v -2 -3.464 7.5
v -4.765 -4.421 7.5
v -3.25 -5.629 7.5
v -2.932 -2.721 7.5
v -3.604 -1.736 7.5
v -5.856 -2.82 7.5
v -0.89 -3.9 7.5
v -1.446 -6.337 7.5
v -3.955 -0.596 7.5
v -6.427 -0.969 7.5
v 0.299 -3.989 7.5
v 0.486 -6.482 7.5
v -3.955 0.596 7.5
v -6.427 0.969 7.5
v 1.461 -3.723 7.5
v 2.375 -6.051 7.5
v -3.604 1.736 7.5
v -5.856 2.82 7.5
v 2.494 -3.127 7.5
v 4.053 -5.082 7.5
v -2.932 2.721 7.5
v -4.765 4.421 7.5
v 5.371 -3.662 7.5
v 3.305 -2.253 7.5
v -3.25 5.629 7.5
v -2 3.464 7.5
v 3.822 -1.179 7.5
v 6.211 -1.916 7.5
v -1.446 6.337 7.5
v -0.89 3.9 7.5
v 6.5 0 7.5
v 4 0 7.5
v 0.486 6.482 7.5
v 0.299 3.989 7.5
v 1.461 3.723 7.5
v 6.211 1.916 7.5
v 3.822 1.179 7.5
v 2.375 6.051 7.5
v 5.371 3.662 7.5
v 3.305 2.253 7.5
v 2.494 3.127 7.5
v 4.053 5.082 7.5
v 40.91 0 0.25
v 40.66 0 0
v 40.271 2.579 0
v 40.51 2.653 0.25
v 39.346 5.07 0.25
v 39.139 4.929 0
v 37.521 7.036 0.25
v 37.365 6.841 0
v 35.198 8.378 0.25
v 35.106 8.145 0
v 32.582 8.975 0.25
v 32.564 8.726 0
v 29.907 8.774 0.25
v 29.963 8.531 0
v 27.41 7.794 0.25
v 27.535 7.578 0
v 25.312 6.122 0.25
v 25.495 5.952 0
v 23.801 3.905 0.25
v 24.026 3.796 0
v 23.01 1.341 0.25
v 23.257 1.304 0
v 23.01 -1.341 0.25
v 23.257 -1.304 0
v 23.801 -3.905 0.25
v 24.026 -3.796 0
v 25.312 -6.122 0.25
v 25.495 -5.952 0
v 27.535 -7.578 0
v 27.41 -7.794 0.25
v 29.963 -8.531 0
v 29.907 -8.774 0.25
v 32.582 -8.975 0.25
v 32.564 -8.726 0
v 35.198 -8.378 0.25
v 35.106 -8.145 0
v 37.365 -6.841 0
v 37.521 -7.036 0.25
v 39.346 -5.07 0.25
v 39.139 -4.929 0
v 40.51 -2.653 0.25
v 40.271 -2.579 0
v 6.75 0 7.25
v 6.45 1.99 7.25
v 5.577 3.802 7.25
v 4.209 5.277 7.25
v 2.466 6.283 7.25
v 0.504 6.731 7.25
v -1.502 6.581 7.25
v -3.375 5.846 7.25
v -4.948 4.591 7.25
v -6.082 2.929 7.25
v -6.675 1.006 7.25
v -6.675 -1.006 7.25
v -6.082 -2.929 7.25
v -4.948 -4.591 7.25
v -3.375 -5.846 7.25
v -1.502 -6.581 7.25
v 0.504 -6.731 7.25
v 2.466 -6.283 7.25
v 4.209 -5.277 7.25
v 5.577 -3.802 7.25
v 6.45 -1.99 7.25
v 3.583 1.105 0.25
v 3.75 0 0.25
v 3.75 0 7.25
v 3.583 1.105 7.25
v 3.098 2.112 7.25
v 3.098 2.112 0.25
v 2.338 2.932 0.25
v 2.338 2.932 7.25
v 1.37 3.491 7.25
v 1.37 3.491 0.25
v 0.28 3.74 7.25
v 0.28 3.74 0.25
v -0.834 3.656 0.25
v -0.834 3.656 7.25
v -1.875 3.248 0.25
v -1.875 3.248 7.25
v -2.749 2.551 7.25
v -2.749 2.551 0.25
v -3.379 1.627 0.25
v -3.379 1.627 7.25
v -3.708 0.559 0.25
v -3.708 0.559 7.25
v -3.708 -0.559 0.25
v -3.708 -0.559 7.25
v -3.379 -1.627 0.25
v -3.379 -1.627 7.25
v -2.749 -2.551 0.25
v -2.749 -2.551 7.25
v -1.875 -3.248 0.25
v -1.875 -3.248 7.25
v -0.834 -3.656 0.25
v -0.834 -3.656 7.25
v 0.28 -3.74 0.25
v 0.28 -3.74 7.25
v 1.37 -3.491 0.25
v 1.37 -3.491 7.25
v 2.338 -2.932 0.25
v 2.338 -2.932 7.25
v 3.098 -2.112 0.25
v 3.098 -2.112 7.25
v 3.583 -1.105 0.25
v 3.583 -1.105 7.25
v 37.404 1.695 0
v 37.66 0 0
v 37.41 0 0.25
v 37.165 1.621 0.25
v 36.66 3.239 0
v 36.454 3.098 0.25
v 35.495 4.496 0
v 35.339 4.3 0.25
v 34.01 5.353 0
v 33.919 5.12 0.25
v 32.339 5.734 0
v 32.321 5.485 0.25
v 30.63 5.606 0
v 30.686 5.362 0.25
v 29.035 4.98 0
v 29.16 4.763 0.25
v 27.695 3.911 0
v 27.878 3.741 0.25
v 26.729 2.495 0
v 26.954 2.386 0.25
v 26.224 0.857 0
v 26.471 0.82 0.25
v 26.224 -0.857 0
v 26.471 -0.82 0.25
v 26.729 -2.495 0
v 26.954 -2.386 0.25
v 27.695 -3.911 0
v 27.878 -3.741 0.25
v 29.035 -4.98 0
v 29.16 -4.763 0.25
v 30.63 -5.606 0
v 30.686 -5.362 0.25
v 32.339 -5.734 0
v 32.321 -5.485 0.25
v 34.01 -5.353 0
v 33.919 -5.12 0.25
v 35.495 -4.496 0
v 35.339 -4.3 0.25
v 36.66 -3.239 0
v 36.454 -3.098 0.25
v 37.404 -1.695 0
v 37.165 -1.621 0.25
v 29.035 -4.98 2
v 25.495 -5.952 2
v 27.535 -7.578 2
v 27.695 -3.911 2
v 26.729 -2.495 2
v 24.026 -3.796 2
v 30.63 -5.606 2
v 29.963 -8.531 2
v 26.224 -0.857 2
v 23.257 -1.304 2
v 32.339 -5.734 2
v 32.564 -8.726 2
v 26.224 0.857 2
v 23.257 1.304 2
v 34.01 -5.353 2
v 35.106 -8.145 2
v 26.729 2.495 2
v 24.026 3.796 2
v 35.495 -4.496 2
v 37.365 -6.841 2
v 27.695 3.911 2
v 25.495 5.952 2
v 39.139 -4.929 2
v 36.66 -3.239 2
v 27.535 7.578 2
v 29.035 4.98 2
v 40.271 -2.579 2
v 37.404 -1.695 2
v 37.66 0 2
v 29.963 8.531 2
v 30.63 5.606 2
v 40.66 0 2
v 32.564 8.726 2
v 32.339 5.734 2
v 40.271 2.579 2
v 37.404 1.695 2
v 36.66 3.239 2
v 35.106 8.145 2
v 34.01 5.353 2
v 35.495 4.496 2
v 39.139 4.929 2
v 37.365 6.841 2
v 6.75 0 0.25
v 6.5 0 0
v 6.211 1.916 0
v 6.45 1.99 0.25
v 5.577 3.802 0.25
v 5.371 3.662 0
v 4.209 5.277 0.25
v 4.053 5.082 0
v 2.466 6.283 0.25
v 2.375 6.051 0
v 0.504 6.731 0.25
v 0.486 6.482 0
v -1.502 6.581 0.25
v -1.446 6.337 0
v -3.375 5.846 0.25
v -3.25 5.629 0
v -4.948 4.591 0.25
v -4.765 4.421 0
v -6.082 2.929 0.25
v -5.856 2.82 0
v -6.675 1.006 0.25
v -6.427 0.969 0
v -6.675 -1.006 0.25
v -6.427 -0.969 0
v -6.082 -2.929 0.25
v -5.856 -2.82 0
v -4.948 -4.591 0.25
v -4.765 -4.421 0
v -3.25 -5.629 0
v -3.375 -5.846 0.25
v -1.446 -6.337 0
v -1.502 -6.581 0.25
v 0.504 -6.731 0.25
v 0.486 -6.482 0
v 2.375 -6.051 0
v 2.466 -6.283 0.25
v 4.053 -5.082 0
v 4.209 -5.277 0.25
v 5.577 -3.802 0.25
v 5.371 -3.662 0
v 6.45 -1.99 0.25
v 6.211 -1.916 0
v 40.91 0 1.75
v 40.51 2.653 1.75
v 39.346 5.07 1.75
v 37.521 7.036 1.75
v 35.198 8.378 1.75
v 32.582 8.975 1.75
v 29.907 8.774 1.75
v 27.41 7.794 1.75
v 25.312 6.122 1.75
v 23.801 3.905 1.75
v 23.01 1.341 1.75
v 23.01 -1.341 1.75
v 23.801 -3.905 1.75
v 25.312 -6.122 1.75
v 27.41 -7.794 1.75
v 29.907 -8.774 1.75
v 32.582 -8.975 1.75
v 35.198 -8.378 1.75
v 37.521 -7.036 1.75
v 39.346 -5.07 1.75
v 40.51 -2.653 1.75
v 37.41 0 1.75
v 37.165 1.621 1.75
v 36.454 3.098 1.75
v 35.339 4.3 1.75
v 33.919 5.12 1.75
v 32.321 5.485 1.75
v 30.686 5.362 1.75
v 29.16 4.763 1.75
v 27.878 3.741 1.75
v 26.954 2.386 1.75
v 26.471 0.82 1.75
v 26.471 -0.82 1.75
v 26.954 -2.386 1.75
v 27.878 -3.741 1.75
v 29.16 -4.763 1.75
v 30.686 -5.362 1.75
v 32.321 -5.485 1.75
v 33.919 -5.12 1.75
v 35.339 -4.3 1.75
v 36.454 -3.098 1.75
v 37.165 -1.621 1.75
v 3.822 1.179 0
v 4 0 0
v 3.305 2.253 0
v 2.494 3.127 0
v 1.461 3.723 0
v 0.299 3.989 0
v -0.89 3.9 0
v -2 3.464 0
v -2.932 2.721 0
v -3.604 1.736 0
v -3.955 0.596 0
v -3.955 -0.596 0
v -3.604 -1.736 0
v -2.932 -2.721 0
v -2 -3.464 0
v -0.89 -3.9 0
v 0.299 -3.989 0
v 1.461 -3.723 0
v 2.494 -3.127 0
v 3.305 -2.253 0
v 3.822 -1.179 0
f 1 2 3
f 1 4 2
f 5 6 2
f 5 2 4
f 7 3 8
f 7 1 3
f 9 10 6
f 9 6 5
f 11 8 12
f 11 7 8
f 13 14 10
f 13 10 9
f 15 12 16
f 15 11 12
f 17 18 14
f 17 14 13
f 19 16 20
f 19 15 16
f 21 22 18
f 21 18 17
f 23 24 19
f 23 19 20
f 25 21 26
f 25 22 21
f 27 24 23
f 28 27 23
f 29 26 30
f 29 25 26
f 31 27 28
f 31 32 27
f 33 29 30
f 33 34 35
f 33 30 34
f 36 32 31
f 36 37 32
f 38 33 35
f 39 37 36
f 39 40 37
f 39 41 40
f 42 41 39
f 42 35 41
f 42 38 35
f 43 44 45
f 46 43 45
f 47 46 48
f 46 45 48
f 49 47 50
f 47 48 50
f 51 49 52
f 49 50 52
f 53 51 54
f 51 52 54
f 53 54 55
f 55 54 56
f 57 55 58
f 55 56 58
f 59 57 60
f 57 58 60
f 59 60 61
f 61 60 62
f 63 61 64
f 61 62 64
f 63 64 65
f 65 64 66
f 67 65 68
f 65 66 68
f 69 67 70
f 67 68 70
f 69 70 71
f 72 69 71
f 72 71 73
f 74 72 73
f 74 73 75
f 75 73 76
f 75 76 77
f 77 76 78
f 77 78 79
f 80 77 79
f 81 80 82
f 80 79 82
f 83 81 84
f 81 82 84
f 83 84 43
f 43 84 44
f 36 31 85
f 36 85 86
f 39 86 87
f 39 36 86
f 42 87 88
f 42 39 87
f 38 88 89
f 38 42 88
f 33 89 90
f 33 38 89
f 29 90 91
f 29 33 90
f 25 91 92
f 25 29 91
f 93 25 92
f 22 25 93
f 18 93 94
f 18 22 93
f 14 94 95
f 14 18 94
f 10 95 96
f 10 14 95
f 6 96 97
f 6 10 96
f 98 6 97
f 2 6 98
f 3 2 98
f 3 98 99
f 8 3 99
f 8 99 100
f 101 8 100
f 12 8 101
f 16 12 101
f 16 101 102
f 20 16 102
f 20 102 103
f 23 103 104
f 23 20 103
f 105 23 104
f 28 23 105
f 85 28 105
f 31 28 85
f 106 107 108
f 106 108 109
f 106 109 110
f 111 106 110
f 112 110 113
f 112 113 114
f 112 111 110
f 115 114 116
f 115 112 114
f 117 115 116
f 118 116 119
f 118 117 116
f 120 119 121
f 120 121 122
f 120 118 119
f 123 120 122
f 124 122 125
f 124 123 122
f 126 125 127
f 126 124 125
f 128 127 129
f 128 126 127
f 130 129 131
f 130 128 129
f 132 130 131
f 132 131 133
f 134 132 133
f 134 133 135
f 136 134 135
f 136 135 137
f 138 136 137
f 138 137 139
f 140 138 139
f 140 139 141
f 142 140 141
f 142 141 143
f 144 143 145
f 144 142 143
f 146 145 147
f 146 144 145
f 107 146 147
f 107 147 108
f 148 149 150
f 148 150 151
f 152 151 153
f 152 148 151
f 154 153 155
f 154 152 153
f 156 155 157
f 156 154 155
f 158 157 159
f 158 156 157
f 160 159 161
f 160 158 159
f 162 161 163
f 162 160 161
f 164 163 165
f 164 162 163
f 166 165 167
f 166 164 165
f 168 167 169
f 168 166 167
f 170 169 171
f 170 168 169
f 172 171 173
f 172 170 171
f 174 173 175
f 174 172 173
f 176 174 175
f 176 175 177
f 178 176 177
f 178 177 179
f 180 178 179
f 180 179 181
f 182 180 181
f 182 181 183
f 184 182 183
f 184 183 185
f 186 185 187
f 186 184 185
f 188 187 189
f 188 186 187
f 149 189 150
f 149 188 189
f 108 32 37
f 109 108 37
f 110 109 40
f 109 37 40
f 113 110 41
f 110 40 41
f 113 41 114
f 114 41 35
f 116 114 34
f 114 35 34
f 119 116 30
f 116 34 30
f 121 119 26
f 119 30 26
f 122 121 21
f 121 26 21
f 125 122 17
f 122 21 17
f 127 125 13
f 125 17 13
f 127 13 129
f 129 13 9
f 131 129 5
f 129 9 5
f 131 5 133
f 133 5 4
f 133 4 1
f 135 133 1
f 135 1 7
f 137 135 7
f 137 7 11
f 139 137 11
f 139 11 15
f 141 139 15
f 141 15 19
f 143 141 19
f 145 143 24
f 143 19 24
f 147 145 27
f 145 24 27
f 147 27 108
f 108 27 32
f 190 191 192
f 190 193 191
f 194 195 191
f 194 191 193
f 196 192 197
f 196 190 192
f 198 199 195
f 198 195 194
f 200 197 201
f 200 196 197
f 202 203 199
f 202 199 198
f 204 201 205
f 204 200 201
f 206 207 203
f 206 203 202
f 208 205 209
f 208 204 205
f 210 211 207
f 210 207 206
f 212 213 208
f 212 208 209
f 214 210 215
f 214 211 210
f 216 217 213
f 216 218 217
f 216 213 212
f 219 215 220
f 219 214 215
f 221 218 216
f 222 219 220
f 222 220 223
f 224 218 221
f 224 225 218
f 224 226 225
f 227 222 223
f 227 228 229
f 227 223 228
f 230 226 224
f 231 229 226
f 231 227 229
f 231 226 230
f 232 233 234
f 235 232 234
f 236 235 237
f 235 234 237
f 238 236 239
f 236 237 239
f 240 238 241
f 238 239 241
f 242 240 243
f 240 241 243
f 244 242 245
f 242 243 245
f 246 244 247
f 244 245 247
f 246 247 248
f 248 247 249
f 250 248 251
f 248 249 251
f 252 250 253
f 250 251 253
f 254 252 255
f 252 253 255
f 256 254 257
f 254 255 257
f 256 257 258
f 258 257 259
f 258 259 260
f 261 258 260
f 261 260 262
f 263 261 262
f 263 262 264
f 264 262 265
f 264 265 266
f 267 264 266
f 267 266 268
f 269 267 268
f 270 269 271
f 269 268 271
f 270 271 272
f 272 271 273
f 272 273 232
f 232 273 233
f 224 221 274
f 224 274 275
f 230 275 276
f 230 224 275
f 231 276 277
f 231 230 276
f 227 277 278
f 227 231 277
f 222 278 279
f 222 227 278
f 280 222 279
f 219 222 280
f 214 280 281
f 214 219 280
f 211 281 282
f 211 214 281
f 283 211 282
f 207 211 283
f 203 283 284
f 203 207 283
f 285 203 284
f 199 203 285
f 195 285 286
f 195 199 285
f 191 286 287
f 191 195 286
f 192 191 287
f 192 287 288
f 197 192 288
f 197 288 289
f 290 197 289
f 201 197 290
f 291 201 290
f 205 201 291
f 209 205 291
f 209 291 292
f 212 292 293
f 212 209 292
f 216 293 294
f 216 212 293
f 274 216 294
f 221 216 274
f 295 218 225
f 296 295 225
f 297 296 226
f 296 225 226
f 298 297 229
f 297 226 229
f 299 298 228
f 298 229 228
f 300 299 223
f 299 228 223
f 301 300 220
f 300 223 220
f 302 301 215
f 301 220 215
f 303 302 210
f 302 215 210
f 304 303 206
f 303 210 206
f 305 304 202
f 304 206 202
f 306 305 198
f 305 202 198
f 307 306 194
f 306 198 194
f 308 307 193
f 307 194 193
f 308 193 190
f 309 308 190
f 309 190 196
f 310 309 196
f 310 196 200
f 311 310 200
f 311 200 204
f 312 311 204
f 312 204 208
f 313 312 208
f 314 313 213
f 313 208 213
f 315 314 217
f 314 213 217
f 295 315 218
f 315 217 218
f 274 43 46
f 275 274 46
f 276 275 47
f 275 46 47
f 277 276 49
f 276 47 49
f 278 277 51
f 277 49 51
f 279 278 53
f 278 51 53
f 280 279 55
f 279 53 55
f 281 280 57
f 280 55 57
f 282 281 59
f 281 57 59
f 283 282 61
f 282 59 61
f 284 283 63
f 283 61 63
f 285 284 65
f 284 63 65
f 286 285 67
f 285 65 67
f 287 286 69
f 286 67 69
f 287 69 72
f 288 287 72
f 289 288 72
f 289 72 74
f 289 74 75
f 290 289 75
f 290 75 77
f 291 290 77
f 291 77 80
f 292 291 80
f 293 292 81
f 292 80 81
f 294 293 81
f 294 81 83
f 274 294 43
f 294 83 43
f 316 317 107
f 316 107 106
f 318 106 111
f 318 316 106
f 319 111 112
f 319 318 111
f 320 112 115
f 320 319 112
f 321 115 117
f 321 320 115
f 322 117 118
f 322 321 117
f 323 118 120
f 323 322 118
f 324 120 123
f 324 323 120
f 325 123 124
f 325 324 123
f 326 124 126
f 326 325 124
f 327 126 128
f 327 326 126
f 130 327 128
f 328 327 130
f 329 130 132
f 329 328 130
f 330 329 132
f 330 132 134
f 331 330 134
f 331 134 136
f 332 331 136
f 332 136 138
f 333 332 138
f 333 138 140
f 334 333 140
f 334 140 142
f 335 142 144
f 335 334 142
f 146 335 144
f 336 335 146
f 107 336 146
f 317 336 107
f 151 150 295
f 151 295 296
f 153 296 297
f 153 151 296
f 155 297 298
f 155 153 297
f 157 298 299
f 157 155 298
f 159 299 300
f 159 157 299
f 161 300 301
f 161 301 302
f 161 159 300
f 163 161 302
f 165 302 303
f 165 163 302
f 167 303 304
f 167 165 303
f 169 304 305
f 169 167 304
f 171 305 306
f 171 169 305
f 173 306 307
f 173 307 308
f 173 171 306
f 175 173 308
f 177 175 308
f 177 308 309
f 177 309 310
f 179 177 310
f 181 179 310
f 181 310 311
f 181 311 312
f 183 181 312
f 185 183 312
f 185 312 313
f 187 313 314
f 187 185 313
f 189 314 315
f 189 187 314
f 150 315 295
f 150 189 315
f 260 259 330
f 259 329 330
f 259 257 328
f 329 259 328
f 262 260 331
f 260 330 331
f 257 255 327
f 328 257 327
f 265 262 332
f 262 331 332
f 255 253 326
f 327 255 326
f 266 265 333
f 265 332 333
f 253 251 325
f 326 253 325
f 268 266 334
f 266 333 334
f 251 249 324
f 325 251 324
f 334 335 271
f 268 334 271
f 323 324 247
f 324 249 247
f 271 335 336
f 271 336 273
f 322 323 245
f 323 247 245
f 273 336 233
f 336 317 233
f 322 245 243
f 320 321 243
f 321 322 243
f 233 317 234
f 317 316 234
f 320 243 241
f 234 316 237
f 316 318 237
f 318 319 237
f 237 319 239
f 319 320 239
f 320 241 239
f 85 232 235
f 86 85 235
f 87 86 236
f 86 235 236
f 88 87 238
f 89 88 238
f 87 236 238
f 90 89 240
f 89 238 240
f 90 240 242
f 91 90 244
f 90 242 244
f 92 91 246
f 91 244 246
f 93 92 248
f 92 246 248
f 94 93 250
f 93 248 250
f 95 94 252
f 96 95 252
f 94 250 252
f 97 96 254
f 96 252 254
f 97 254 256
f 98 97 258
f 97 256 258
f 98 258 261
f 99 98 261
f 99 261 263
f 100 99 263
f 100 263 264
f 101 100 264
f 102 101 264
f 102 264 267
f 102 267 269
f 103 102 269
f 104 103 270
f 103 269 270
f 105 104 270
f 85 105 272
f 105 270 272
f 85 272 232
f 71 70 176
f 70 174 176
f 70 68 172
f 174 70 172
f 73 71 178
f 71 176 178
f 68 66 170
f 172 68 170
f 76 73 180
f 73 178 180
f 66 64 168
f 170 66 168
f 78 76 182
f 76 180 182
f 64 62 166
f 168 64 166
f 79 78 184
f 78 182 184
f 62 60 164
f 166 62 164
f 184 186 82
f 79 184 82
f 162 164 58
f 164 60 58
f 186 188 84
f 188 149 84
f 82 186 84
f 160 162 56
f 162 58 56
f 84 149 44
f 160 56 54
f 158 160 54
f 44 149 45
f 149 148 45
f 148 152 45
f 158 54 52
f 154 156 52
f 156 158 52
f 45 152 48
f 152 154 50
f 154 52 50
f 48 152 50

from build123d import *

# Parameters (mm, degrees)
F0_R      = 6.75
F0_R_2    = 3.75
F1_DEPTH  = 7.5
F2_R      = 9
F2_R_2    = 5.5
F3_DEPTH  = 2
F4_SIZE   = 0.25
F4_2_SIZE = 0.25


with BuildPart() as f1:
    # F0 (on Top) → F1 (new body)
    with BuildSketch(Plane.XY):
        Circle(F0_R)
        Circle(F0_R_2, mode=Mode.SUBTRACT)
    extrude(amount=F1_DEPTH)

    # F4
    f4_edges = [f1.edges().sort_by_distance(p)[0] for p in [
        (-6.75, 0, 7.5),
        (-3.75, 0, 7.5),
        (-6.75, 0, 0),
        (-3.75, 0, 0),
    ]]
    chamfer(f4_edges, length=F4_SIZE)


with BuildPart() as f3:
    # F2 (on Top) → F3 (new body)
    with BuildSketch(Plane.XY):
        with Locations((31.909617, 0)):
            Circle(F2_R)
        with Locations((31.909617, 0)):
            Circle(F2_R_2, mode=Mode.SUBTRACT)
    extrude(amount=F3_DEPTH)

    # F4#2
    f4_2_edges = [f3.edges().sort_by_distance(p)[0] for p in [
        (22.909617, 0, 2),
        (26.409617, 0, 2),
        (26.409617, 0, 0),
        (22.909617, 0, 0),
    ]]
    chamfer(f4_2_edges, length=F4_2_SIZE)


solid = Compound([f1.part, f3.part])
